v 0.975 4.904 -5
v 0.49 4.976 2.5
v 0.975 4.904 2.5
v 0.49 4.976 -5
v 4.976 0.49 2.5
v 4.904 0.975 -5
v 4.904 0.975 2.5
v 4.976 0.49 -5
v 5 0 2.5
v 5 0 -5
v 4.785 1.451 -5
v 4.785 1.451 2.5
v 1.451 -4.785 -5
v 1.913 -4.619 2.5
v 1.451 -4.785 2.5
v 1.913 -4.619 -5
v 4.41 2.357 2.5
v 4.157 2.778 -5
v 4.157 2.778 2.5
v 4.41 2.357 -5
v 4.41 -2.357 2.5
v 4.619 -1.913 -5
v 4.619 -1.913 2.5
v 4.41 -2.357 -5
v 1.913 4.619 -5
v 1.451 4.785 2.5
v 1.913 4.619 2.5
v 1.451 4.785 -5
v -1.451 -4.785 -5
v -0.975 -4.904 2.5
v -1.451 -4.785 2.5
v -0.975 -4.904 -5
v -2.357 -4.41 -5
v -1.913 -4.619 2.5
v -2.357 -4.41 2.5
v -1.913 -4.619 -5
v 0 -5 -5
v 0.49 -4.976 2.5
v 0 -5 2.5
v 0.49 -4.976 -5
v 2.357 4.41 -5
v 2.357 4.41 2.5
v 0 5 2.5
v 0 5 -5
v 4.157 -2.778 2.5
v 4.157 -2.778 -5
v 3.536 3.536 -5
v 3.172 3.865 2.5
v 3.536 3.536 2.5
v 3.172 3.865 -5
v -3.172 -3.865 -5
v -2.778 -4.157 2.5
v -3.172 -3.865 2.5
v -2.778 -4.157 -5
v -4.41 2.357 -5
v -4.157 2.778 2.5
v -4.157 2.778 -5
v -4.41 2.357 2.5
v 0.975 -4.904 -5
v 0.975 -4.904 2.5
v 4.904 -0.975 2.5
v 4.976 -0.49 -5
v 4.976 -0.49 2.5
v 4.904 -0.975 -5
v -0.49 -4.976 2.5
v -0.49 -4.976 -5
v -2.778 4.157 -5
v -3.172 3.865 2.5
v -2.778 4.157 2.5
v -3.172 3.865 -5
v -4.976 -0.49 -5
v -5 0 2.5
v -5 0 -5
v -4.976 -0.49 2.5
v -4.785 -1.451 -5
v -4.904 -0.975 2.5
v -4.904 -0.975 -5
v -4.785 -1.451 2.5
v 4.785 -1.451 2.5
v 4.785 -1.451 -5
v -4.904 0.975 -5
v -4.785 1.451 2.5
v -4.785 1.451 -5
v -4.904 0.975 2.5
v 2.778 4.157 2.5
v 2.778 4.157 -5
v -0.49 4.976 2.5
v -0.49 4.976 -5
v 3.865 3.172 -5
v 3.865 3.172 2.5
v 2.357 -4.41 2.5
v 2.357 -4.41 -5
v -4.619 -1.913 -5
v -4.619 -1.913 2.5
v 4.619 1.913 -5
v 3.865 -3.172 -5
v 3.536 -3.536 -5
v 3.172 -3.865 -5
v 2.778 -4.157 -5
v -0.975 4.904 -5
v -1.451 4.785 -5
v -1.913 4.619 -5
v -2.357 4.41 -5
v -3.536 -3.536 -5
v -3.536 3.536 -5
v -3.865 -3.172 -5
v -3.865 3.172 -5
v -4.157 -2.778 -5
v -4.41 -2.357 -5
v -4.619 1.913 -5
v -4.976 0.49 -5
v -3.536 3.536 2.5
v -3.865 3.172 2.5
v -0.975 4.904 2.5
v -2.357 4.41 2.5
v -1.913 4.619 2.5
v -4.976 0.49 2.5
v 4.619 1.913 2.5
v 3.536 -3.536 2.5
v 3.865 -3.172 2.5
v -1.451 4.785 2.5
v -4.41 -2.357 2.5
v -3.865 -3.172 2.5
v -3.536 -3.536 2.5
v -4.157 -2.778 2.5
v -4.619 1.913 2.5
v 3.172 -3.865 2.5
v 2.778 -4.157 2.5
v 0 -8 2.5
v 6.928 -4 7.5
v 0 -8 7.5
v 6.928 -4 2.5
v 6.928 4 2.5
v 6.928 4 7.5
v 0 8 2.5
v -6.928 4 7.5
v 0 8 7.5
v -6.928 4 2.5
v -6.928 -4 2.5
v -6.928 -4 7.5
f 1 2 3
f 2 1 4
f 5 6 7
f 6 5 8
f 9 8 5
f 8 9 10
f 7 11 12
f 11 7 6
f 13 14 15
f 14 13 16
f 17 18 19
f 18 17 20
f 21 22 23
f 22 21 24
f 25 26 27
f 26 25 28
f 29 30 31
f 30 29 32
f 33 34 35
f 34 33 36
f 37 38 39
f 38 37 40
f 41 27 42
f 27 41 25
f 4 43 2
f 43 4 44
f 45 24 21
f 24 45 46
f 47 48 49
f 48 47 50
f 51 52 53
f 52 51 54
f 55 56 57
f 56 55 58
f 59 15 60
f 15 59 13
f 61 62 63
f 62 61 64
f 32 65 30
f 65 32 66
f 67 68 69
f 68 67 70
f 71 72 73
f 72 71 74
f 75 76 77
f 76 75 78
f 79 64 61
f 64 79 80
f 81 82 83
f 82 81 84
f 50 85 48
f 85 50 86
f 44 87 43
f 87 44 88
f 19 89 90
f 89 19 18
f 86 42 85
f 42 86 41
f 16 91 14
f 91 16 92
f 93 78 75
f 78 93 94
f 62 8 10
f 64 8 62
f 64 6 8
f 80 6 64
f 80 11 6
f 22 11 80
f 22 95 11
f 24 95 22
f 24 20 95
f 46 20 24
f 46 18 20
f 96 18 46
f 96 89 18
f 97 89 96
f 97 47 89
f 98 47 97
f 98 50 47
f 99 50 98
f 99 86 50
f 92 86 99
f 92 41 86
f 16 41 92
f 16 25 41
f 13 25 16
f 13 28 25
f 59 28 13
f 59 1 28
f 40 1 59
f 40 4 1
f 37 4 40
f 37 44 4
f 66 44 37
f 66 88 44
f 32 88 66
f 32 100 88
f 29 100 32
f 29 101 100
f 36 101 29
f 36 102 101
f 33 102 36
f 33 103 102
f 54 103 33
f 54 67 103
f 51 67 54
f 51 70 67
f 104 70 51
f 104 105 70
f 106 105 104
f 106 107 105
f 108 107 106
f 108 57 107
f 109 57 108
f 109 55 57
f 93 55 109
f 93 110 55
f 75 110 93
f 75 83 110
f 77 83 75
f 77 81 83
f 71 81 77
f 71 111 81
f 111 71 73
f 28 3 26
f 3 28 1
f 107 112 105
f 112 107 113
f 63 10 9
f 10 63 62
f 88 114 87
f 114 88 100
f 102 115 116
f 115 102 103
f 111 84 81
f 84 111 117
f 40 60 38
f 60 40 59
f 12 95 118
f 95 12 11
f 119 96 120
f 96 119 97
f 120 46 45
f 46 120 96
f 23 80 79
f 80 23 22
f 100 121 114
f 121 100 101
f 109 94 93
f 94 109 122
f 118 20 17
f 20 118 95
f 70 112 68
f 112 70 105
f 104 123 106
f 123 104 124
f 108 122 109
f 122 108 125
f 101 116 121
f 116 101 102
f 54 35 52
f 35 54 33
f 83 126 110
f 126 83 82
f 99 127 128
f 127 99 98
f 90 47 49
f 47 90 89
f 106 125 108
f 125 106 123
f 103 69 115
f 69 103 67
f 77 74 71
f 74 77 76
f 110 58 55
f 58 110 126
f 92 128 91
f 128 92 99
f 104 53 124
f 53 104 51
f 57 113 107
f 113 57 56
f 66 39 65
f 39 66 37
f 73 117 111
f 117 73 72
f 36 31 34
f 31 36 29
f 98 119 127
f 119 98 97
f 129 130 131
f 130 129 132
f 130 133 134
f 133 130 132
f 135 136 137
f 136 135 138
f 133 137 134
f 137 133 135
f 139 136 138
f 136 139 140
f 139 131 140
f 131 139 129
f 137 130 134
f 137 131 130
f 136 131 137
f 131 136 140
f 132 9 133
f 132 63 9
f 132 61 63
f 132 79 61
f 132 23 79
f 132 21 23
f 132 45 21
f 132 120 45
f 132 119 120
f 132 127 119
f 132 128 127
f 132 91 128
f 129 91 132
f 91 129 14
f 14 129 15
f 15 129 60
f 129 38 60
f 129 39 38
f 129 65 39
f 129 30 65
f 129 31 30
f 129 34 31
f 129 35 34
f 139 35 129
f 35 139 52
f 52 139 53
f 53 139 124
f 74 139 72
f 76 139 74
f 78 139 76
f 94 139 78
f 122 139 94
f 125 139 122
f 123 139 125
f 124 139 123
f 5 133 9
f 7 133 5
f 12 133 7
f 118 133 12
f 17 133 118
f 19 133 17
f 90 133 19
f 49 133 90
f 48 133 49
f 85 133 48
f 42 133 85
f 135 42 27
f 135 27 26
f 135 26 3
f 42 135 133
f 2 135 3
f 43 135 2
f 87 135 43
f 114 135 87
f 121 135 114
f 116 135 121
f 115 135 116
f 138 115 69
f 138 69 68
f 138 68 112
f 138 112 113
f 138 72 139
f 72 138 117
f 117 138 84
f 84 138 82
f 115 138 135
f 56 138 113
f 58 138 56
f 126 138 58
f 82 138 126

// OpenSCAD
module flanged_bushing() {
    $fn = 64;
    // Main cylindrical body
    cylinder(h = 10, r = 5, center = true);
    
    // Hexagonal flange
    translate([0, 0, 5])
    rotate([0, 0, 30])
    scale([1, 1, 0.5])
    cylinder(h = 10, r = 8, center = true, $fn = 6);
}

flanged_bushing();
